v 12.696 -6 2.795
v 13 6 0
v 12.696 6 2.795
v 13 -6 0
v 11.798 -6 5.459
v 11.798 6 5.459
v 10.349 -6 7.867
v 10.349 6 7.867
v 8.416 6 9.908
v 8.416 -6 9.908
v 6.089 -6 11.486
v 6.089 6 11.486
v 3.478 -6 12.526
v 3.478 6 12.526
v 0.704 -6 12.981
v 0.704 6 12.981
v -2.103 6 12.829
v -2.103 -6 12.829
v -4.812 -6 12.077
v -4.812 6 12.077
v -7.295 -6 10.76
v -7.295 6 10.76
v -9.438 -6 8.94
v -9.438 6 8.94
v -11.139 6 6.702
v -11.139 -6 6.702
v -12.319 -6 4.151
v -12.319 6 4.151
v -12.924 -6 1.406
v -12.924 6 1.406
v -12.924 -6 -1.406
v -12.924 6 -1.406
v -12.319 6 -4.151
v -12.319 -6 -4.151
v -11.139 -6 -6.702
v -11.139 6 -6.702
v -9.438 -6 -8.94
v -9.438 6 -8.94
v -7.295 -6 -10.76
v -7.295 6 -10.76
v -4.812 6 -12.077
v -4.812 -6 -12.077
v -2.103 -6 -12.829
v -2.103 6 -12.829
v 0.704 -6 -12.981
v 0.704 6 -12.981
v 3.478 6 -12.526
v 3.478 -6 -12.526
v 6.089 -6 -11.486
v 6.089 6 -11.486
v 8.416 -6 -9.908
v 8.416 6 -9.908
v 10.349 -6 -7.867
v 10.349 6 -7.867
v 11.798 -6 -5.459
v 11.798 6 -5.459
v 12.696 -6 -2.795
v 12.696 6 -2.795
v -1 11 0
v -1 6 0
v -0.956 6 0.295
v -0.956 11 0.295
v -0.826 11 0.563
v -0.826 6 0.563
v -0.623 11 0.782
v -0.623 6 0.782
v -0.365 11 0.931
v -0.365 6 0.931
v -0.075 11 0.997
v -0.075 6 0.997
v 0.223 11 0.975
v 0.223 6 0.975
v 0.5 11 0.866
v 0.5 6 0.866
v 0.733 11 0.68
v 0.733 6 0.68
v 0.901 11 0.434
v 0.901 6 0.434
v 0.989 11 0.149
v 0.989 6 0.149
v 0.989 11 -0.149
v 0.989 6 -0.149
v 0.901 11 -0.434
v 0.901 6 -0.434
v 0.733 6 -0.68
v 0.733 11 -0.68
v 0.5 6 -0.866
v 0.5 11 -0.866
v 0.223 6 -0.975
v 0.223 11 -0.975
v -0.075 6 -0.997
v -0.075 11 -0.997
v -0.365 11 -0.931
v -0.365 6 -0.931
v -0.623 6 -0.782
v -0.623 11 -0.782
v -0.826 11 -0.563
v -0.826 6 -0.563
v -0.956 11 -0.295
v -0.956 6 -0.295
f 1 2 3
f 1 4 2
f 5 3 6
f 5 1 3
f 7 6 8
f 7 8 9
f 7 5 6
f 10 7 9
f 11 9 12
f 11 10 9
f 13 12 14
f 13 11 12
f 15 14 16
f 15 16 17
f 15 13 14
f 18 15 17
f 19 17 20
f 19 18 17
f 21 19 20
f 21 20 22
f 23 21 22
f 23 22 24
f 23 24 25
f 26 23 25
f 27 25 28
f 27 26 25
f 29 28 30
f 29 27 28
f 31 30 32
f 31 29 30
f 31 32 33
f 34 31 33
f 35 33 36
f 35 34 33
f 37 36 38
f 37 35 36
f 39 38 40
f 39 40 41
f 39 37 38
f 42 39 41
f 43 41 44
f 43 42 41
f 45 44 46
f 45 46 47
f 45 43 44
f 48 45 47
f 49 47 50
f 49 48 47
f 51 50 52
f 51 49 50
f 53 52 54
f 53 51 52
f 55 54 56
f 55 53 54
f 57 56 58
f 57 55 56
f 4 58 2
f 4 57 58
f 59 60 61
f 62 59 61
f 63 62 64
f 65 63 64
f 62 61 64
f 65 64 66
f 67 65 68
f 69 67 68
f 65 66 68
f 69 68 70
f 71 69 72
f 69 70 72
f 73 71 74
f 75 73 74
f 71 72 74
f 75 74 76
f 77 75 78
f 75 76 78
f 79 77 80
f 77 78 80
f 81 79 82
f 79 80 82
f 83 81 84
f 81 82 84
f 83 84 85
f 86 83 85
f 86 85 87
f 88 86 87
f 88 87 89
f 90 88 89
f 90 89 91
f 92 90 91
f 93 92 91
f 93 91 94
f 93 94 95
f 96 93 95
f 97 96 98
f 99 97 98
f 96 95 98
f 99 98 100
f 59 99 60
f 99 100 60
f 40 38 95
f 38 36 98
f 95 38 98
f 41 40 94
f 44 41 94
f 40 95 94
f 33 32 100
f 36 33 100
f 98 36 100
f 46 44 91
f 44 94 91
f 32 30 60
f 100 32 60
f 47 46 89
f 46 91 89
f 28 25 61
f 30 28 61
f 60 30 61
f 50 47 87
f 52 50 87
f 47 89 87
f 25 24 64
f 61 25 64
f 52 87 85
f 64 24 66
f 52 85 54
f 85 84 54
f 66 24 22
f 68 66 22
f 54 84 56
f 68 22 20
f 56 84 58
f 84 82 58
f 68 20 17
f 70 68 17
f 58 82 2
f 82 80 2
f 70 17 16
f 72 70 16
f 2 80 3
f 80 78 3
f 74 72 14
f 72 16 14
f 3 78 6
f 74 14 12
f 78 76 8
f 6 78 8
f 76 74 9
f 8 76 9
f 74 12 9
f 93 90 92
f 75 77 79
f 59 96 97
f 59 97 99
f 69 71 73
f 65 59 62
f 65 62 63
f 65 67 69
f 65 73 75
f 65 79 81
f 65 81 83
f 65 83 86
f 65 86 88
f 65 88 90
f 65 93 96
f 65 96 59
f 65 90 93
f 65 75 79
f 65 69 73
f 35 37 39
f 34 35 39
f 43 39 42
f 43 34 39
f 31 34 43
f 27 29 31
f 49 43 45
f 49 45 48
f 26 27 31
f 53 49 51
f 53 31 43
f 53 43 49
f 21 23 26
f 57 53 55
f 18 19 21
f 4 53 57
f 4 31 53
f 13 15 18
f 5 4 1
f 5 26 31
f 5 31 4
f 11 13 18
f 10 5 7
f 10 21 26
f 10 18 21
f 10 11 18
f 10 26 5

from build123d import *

# Parameters (mm, degrees)
F0_R     = 13
F0_R_2   = 11.5
F1_DEPTH = 6
F2_DEPTH = 6
F3_R     = 1
F4_DEPTH = 5


with BuildPart() as f1:
    # F0 (on Front) → F1 (new body, symmetric)
    with BuildSketch(Plane.XZ):
        Circle(F0_R)
        Circle(F0_R_2, mode=Mode.SUBTRACT)
    extrude(amount=F1_DEPTH, both=True)

    # F0 (on Front) → F2 (join, symmetric)
    with BuildSketch(Plane.XZ):
        Circle(F0_R_2)
    extrude(amount=F2_DEPTH, both=True)

    # F3 (on face) → F4 (join)
    with BuildSketch(Plane(origin=(0, 6, 0), x_dir=(-1, 0, 0), z_dir=(0, 1, 0))):
        Circle(F3_R)
    extrude(amount=F4_DEPTH)


solid = f1.part
